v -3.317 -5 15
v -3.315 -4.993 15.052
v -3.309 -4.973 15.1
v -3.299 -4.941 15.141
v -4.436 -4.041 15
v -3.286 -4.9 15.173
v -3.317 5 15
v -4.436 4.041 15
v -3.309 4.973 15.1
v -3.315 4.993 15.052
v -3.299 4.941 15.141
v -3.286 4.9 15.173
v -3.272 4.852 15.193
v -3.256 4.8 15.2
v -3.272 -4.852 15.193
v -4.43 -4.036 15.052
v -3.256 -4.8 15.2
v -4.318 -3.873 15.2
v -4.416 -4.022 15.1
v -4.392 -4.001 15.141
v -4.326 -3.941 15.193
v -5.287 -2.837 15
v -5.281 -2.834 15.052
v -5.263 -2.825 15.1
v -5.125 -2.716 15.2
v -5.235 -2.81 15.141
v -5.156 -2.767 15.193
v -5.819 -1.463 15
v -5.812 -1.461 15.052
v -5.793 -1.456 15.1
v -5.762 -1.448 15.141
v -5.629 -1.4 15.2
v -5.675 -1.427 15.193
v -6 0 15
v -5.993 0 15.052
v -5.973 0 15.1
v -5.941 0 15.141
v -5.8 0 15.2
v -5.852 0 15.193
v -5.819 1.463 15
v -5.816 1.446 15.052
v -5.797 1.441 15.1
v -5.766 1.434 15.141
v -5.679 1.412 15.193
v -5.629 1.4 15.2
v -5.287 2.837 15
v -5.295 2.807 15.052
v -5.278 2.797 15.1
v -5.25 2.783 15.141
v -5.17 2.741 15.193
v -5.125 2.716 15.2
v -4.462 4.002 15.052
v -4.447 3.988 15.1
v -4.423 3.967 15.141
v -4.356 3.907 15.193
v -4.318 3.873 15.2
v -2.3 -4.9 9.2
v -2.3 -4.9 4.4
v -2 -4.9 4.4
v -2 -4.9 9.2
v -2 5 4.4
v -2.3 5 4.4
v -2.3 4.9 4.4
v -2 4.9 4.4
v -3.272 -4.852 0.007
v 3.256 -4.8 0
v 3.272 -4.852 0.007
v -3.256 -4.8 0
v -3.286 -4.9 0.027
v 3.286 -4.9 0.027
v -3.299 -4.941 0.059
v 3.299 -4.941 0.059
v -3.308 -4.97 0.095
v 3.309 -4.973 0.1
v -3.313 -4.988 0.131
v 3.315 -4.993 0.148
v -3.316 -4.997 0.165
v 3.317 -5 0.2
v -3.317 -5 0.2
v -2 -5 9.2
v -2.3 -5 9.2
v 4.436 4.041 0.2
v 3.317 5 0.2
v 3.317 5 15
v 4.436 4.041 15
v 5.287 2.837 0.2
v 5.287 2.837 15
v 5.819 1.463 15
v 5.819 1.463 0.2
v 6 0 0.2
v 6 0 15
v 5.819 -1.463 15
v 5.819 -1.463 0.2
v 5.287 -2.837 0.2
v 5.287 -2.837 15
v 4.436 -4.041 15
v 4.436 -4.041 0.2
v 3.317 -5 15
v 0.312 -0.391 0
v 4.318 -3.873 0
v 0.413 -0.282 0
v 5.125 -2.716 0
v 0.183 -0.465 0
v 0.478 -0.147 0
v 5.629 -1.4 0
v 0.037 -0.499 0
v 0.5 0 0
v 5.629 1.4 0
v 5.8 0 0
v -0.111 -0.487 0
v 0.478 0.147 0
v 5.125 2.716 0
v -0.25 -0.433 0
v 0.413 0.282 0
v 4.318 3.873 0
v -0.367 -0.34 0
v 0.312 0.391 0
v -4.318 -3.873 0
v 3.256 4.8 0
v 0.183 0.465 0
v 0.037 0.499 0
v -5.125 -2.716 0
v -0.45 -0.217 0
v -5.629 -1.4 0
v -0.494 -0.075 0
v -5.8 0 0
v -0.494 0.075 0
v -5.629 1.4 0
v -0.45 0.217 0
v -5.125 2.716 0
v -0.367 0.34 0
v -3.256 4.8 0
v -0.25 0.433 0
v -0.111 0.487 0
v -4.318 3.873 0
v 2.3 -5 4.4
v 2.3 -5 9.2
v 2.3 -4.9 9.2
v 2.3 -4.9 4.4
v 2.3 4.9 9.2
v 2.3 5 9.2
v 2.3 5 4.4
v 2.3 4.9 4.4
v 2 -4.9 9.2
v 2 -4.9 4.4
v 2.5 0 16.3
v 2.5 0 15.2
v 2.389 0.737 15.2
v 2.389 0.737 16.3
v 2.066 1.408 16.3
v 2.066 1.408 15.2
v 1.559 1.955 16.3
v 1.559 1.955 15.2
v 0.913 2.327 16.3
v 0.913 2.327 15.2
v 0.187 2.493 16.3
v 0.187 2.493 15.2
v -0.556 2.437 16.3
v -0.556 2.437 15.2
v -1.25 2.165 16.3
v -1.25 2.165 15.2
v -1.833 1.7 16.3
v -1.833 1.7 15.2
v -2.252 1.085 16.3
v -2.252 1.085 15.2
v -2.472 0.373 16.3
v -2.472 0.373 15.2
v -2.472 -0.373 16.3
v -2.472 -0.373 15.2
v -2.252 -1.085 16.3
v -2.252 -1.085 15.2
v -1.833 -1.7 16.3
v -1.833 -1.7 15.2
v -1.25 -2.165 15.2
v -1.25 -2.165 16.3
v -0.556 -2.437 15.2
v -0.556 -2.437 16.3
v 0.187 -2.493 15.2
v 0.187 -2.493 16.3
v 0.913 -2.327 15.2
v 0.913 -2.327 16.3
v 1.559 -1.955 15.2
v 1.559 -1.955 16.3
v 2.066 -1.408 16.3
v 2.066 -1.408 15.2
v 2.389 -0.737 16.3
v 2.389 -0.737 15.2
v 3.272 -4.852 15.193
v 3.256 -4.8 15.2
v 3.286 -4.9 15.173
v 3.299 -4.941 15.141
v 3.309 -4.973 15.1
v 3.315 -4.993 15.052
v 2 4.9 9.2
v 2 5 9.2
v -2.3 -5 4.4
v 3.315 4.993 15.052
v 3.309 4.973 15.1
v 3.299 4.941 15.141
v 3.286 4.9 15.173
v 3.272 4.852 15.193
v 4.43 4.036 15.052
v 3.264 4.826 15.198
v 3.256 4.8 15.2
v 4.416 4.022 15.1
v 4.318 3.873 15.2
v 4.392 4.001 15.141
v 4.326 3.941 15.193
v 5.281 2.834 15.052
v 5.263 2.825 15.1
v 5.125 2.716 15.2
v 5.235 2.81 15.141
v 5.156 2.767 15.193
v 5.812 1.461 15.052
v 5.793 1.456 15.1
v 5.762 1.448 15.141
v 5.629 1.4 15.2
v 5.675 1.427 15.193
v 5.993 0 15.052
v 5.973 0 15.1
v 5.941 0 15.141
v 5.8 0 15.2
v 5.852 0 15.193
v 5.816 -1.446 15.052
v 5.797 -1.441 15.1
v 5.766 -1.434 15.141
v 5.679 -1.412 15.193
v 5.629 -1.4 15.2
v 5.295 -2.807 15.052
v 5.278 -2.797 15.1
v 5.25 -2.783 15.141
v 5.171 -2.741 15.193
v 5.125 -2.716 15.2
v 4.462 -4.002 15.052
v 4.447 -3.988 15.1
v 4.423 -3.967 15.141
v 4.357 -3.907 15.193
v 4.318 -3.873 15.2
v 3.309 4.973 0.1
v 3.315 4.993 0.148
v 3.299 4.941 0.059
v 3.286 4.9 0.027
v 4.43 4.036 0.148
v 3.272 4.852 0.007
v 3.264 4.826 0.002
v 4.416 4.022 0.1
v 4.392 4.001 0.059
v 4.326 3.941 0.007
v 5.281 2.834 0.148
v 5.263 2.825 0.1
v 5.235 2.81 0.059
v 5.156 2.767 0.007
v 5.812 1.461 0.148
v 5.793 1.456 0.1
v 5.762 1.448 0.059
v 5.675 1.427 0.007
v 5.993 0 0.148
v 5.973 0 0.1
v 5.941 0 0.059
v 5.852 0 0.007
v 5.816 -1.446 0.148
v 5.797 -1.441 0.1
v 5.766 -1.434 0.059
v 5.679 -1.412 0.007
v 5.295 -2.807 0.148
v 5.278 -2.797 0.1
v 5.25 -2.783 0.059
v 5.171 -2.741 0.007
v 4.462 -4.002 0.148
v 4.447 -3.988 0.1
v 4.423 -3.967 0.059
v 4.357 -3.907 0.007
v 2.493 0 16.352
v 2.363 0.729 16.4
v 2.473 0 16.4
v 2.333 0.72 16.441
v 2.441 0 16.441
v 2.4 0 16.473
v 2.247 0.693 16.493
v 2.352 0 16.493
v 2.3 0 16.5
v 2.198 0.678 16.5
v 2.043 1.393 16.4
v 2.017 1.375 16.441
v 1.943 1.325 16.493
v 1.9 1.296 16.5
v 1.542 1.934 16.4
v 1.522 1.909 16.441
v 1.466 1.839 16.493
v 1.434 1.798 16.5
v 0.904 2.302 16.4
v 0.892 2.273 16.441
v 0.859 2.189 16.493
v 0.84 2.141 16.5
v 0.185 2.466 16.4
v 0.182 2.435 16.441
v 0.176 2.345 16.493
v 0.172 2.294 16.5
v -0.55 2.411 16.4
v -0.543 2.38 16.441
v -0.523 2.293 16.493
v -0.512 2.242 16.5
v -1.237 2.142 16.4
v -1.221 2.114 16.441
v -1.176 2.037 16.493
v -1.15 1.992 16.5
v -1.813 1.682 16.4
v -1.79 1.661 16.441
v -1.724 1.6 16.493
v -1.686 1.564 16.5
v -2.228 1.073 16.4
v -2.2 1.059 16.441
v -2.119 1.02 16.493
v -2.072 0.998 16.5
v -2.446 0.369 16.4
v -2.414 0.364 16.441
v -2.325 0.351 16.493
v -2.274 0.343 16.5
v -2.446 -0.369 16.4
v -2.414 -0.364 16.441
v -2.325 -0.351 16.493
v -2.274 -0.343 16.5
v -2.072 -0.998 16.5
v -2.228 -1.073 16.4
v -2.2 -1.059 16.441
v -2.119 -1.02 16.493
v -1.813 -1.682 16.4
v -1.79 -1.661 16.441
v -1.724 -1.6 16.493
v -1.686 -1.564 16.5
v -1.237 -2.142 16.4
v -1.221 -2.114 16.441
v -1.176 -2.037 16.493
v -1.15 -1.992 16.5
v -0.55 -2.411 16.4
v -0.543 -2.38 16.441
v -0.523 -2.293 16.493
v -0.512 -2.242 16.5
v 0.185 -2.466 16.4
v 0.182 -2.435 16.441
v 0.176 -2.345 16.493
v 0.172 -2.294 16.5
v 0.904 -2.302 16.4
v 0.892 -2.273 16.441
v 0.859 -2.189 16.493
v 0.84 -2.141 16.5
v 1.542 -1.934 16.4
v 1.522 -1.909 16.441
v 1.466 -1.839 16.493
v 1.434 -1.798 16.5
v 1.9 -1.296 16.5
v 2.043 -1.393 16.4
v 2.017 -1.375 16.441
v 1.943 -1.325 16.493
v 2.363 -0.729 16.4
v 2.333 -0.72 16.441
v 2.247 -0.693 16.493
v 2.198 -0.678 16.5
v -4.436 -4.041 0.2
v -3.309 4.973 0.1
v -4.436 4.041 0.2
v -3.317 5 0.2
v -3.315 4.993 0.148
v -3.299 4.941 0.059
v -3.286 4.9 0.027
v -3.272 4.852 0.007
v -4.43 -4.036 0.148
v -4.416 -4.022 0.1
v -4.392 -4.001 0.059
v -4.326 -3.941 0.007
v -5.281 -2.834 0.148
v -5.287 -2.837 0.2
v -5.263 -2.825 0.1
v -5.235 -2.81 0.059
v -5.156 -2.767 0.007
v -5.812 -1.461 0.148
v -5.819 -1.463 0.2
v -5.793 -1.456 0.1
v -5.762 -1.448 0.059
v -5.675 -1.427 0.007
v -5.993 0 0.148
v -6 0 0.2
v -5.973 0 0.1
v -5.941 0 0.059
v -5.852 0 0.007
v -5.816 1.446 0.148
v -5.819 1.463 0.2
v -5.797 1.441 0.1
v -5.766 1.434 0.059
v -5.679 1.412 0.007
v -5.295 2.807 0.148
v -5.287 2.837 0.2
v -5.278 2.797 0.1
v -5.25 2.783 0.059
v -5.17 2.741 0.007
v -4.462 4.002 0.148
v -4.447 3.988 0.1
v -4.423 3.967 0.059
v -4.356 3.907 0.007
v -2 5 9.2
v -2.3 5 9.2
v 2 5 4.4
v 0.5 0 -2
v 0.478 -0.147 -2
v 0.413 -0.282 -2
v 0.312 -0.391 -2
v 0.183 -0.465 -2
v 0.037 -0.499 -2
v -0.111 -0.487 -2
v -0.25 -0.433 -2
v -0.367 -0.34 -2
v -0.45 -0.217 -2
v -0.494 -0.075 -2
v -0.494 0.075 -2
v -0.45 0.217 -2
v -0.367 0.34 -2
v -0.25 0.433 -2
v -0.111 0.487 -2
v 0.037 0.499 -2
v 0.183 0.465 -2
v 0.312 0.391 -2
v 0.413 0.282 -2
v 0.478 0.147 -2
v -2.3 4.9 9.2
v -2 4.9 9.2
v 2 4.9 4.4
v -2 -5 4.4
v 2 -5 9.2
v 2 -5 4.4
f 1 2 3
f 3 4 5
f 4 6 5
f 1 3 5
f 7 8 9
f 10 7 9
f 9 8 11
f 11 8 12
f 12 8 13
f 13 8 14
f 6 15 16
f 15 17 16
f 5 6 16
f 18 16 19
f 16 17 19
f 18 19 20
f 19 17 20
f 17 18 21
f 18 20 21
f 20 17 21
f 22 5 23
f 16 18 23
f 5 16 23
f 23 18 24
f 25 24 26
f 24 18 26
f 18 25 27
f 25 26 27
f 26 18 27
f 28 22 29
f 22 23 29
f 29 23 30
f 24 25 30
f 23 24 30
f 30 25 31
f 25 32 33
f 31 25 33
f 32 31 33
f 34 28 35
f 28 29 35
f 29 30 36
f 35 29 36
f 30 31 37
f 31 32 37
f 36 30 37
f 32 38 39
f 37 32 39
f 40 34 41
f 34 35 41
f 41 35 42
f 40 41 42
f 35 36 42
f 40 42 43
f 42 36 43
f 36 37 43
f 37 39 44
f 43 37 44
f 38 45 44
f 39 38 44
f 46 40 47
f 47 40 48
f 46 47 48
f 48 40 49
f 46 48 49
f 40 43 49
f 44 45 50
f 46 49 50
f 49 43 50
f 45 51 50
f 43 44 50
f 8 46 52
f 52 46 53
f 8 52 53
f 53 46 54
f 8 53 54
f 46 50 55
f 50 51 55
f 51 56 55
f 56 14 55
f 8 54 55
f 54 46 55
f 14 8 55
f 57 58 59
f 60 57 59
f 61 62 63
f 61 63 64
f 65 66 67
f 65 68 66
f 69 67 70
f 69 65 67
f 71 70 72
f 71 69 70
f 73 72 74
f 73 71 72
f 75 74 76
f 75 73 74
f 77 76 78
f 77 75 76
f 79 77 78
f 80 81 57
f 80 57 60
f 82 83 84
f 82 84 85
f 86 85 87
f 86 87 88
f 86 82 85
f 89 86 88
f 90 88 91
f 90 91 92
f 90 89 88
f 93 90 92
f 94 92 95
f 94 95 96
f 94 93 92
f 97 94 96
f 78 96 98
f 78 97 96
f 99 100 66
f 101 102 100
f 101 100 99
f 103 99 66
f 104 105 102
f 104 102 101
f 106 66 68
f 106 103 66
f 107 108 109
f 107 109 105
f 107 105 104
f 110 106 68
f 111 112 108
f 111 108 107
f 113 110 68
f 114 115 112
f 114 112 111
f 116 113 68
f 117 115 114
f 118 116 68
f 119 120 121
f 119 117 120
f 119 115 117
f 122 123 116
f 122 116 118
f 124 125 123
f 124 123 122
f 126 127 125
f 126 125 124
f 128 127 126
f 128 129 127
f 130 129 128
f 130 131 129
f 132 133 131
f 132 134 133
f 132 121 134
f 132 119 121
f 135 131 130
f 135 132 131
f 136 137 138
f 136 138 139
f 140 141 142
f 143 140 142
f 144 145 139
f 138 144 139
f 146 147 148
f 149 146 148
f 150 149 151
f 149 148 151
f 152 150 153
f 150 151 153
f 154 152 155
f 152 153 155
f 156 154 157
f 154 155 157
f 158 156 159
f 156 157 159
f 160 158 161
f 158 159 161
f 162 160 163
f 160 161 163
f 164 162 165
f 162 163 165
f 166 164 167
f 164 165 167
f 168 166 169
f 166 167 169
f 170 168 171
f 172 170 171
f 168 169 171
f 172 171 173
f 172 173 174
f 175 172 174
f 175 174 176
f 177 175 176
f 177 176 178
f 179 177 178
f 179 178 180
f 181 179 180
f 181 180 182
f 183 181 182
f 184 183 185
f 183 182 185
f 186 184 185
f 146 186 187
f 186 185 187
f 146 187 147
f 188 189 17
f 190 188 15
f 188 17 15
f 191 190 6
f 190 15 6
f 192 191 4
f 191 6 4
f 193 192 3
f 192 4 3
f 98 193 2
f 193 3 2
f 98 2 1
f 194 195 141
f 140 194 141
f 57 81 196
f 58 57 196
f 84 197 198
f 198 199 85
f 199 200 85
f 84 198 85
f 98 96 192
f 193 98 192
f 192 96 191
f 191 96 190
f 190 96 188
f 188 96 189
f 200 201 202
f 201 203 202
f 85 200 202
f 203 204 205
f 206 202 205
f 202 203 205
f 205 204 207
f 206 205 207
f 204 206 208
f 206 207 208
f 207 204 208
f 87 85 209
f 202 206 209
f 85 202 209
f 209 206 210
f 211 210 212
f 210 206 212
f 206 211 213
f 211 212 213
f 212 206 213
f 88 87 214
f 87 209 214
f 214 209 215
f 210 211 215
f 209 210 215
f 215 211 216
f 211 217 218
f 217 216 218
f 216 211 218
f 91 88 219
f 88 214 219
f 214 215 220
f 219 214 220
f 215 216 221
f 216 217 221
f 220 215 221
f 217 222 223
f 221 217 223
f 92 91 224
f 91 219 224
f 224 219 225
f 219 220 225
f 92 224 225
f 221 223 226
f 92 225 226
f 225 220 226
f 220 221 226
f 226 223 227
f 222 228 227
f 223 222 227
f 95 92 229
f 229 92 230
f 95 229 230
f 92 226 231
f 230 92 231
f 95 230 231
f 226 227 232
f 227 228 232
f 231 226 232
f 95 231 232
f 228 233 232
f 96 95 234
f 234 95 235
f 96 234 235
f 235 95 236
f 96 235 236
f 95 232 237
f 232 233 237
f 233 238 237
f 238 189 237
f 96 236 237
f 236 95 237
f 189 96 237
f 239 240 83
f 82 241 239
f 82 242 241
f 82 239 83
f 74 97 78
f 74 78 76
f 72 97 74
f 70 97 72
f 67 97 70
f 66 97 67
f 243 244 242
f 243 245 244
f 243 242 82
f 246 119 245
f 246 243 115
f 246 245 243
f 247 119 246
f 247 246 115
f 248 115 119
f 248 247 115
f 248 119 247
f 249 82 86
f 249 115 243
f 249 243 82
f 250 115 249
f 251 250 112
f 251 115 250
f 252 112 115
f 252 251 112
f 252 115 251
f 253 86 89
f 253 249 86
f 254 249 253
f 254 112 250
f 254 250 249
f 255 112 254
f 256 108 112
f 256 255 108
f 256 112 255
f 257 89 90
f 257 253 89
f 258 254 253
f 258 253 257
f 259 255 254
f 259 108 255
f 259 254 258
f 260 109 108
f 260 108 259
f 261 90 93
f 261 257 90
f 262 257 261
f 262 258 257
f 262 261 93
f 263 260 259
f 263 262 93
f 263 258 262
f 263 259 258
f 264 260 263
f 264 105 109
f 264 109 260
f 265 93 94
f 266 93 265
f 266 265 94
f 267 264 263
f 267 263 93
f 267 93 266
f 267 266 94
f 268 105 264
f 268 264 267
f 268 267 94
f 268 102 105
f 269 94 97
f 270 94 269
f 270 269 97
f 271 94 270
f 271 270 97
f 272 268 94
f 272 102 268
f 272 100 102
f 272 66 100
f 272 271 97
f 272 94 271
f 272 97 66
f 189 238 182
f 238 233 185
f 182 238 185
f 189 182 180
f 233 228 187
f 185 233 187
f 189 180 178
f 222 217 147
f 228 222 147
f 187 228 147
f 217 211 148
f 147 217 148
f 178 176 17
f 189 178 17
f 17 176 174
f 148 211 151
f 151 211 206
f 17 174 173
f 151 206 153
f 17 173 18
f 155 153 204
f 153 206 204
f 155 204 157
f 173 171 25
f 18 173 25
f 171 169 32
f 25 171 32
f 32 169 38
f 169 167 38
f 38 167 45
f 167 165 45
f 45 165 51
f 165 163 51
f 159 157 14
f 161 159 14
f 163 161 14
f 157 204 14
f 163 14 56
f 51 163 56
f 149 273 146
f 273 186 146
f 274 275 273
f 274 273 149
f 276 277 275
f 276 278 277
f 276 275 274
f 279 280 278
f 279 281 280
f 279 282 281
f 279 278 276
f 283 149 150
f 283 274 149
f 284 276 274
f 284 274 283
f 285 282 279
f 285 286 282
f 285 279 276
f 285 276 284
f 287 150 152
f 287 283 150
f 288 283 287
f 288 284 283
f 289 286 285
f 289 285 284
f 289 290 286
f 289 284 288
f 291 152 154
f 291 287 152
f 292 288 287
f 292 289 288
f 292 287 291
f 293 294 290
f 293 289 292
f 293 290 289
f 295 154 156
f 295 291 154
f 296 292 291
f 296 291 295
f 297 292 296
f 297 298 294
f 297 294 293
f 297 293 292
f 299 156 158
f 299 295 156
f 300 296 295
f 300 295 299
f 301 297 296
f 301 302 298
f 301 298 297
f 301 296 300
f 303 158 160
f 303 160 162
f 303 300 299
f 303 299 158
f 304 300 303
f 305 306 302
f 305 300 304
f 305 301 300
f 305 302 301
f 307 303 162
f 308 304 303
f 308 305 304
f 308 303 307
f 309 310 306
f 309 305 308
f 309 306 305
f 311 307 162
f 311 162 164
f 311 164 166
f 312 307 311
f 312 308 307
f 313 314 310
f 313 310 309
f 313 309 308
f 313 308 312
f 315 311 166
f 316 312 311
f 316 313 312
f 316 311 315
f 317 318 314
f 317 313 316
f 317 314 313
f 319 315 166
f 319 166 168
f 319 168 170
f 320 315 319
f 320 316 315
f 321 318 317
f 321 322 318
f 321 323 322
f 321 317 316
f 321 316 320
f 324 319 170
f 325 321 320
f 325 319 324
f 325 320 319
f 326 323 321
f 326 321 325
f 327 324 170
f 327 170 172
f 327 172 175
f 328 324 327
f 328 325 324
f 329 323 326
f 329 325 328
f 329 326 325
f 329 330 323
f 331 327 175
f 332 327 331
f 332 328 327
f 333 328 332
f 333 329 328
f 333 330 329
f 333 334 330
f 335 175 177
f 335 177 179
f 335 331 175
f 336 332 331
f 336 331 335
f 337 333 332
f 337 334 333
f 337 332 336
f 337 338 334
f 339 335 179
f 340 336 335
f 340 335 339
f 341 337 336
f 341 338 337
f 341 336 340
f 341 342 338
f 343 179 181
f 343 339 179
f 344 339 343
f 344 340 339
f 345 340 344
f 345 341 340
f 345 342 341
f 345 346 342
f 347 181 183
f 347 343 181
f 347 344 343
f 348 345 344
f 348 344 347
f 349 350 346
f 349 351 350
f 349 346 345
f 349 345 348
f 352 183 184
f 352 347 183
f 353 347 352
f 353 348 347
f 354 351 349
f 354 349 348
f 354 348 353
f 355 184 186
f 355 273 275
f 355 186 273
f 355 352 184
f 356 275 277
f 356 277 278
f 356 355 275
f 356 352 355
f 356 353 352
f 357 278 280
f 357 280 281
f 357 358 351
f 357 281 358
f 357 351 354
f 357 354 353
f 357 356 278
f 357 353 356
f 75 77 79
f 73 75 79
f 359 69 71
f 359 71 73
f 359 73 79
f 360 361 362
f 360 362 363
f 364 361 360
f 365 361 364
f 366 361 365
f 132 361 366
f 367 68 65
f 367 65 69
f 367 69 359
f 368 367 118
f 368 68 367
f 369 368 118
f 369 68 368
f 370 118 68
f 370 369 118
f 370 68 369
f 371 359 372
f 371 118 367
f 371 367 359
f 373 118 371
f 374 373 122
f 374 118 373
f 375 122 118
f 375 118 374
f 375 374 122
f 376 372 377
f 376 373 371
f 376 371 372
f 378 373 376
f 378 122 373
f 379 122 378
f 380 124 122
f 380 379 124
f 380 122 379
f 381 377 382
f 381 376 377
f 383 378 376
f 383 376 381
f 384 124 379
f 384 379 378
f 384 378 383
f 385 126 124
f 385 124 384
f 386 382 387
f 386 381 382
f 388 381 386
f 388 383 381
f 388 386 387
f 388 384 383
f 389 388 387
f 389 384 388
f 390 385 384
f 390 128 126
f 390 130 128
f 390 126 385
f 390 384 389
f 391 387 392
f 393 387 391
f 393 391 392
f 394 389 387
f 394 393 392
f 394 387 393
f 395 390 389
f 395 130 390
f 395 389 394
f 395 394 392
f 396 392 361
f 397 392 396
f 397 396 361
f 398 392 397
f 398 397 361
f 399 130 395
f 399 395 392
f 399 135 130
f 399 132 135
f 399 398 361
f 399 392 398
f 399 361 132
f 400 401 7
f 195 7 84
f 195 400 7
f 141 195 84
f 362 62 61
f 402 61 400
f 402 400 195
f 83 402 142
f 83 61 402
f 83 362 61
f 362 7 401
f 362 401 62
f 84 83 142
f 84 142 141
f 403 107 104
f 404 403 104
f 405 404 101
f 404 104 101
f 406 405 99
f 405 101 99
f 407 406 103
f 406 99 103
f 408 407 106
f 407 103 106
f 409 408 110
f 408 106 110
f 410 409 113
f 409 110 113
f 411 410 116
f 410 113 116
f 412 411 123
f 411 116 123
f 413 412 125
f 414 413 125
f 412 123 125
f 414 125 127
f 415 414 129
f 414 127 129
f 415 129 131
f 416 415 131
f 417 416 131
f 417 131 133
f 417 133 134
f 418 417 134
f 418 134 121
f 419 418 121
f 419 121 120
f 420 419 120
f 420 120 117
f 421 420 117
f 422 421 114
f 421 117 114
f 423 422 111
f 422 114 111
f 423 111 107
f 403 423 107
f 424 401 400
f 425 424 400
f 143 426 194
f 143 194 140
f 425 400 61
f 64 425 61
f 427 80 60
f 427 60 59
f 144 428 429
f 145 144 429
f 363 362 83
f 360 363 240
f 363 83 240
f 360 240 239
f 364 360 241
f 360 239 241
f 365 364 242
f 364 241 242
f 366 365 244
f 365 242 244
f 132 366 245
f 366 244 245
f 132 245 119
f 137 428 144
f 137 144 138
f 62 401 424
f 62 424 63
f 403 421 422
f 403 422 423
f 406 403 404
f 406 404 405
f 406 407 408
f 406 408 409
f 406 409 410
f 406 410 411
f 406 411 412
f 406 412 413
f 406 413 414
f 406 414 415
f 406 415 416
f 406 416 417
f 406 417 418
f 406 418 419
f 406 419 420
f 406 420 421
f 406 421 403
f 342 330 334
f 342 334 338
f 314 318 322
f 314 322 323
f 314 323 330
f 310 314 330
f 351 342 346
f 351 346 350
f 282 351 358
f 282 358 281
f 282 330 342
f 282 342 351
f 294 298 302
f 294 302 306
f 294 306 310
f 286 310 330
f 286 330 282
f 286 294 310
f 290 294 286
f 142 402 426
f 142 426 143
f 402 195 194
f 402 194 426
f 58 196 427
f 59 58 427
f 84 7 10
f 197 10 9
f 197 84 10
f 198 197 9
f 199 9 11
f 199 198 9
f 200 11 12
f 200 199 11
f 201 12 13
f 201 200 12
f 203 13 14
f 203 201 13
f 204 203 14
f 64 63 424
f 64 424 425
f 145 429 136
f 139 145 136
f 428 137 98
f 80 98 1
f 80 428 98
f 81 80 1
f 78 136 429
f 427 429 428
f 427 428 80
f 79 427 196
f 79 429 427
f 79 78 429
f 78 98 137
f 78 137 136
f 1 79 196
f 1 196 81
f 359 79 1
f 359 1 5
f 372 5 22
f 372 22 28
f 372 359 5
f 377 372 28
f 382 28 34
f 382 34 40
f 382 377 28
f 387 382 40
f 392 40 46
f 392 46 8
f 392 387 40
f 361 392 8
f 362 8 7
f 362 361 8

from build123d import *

# Parameters (mm, degrees)
AUFSATZ_LINEAR_AUSTRAGEN1_DEPTH = 15.2
SKIZZE2_R                       = 2.5
AUFSATZ_LINEAR_AUSTRAGEN2_DEPTH = 1.3
SKIZZE3_R                       = 0.5
AUFSATZ_LINEAR_AUSTRAGEN3_DEPTH = 2
VERRUNDUNG1_R                   = 0.2
SKIZZE4_W                       = 0.3
SKIZZE4_H                       = 4.8
SCHNITT_LINEAR_AUSTRAGEN1_DEPTH = 0.1


with BuildPart() as part:
    # Skizze1 → Aufsatz-Linear austragen1 (new body)
    with BuildSketch(Plane.XY):
        with BuildLine():
            Line((-3.31662479, 5), (3.31662479, 5))
            ThreePointArc((3.31662479, 5), (6, 0), (3.31662479, -5))
            Line((3.31662479, -5), (-3.31662479, -5))
            ThreePointArc((-3.31662479, -5), (-6, 0), (-3.31662479, 5))
        make_face()
    extrude(amount=AUFSATZ_LINEAR_AUSTRAGEN1_DEPTH)

    # Skizze2 → Aufsatz-Linear austragen2 (add)
    with BuildSketch(Plane.XY.offset(15.2)):
        Circle(SKIZZE2_R)
    extrude(amount=AUFSATZ_LINEAR_AUSTRAGEN2_DEPTH)

    # Skizze3 → Aufsatz-Linear austragen3 (add)
    with BuildSketch(Plane(origin=(0, 0, 0), x_dir=(-1, 0, 0), z_dir=(0, 0, -1))):
        with Locations(Location((0, 0, 0), (0, 0, 180))):
            Circle(SKIZZE3_R)
    extrude(amount=AUFSATZ_LINEAR_AUSTRAGEN3_DEPTH)

    # Verrundung1
    verrundung1_edges = [part.edges().sort_by_distance(p)[0] for p in [
        (6, 0, 15.2),
        (0, 5, 15.2),
        (-2.5, 0, 16.5),
        (-6, 0, 15.2),
        (0, 5, 0),
        (6, 0, 0),
        (0, -5, 0),
        (-6, 0, 0),
        (0, -5, 15.2),
    ]]
    fillet(verrundung1_edges, radius=VERRUNDUNG1_R)

    # Skizze4 → Schnitt-Linear austragen1 (cut)
    with BuildSketch(Plane(origin=(0, 5, 0), x_dir=(1, 0, 0), z_dir=(0, 1, 0))):
        with Locations((-2.15, -6.8)):
            Rectangle(SKIZZE4_W, SKIZZE4_H)
        with Locations((2.15, -6.8)):
            Rectangle(SKIZZE4_W, SKIZZE4_H)
    schnitt_linear_austragen1 = extrude(amount=-SCHNITT_LINEAR_AUSTRAGEN1_DEPTH, mode=Mode.SUBTRACT)

    # Spiegeln1: Schnitt-Linear austragen1 across plane
    add(schnitt_linear_austragen1.mirror(Plane.ZX), mode=Mode.SUBTRACT)


solid = part.part
